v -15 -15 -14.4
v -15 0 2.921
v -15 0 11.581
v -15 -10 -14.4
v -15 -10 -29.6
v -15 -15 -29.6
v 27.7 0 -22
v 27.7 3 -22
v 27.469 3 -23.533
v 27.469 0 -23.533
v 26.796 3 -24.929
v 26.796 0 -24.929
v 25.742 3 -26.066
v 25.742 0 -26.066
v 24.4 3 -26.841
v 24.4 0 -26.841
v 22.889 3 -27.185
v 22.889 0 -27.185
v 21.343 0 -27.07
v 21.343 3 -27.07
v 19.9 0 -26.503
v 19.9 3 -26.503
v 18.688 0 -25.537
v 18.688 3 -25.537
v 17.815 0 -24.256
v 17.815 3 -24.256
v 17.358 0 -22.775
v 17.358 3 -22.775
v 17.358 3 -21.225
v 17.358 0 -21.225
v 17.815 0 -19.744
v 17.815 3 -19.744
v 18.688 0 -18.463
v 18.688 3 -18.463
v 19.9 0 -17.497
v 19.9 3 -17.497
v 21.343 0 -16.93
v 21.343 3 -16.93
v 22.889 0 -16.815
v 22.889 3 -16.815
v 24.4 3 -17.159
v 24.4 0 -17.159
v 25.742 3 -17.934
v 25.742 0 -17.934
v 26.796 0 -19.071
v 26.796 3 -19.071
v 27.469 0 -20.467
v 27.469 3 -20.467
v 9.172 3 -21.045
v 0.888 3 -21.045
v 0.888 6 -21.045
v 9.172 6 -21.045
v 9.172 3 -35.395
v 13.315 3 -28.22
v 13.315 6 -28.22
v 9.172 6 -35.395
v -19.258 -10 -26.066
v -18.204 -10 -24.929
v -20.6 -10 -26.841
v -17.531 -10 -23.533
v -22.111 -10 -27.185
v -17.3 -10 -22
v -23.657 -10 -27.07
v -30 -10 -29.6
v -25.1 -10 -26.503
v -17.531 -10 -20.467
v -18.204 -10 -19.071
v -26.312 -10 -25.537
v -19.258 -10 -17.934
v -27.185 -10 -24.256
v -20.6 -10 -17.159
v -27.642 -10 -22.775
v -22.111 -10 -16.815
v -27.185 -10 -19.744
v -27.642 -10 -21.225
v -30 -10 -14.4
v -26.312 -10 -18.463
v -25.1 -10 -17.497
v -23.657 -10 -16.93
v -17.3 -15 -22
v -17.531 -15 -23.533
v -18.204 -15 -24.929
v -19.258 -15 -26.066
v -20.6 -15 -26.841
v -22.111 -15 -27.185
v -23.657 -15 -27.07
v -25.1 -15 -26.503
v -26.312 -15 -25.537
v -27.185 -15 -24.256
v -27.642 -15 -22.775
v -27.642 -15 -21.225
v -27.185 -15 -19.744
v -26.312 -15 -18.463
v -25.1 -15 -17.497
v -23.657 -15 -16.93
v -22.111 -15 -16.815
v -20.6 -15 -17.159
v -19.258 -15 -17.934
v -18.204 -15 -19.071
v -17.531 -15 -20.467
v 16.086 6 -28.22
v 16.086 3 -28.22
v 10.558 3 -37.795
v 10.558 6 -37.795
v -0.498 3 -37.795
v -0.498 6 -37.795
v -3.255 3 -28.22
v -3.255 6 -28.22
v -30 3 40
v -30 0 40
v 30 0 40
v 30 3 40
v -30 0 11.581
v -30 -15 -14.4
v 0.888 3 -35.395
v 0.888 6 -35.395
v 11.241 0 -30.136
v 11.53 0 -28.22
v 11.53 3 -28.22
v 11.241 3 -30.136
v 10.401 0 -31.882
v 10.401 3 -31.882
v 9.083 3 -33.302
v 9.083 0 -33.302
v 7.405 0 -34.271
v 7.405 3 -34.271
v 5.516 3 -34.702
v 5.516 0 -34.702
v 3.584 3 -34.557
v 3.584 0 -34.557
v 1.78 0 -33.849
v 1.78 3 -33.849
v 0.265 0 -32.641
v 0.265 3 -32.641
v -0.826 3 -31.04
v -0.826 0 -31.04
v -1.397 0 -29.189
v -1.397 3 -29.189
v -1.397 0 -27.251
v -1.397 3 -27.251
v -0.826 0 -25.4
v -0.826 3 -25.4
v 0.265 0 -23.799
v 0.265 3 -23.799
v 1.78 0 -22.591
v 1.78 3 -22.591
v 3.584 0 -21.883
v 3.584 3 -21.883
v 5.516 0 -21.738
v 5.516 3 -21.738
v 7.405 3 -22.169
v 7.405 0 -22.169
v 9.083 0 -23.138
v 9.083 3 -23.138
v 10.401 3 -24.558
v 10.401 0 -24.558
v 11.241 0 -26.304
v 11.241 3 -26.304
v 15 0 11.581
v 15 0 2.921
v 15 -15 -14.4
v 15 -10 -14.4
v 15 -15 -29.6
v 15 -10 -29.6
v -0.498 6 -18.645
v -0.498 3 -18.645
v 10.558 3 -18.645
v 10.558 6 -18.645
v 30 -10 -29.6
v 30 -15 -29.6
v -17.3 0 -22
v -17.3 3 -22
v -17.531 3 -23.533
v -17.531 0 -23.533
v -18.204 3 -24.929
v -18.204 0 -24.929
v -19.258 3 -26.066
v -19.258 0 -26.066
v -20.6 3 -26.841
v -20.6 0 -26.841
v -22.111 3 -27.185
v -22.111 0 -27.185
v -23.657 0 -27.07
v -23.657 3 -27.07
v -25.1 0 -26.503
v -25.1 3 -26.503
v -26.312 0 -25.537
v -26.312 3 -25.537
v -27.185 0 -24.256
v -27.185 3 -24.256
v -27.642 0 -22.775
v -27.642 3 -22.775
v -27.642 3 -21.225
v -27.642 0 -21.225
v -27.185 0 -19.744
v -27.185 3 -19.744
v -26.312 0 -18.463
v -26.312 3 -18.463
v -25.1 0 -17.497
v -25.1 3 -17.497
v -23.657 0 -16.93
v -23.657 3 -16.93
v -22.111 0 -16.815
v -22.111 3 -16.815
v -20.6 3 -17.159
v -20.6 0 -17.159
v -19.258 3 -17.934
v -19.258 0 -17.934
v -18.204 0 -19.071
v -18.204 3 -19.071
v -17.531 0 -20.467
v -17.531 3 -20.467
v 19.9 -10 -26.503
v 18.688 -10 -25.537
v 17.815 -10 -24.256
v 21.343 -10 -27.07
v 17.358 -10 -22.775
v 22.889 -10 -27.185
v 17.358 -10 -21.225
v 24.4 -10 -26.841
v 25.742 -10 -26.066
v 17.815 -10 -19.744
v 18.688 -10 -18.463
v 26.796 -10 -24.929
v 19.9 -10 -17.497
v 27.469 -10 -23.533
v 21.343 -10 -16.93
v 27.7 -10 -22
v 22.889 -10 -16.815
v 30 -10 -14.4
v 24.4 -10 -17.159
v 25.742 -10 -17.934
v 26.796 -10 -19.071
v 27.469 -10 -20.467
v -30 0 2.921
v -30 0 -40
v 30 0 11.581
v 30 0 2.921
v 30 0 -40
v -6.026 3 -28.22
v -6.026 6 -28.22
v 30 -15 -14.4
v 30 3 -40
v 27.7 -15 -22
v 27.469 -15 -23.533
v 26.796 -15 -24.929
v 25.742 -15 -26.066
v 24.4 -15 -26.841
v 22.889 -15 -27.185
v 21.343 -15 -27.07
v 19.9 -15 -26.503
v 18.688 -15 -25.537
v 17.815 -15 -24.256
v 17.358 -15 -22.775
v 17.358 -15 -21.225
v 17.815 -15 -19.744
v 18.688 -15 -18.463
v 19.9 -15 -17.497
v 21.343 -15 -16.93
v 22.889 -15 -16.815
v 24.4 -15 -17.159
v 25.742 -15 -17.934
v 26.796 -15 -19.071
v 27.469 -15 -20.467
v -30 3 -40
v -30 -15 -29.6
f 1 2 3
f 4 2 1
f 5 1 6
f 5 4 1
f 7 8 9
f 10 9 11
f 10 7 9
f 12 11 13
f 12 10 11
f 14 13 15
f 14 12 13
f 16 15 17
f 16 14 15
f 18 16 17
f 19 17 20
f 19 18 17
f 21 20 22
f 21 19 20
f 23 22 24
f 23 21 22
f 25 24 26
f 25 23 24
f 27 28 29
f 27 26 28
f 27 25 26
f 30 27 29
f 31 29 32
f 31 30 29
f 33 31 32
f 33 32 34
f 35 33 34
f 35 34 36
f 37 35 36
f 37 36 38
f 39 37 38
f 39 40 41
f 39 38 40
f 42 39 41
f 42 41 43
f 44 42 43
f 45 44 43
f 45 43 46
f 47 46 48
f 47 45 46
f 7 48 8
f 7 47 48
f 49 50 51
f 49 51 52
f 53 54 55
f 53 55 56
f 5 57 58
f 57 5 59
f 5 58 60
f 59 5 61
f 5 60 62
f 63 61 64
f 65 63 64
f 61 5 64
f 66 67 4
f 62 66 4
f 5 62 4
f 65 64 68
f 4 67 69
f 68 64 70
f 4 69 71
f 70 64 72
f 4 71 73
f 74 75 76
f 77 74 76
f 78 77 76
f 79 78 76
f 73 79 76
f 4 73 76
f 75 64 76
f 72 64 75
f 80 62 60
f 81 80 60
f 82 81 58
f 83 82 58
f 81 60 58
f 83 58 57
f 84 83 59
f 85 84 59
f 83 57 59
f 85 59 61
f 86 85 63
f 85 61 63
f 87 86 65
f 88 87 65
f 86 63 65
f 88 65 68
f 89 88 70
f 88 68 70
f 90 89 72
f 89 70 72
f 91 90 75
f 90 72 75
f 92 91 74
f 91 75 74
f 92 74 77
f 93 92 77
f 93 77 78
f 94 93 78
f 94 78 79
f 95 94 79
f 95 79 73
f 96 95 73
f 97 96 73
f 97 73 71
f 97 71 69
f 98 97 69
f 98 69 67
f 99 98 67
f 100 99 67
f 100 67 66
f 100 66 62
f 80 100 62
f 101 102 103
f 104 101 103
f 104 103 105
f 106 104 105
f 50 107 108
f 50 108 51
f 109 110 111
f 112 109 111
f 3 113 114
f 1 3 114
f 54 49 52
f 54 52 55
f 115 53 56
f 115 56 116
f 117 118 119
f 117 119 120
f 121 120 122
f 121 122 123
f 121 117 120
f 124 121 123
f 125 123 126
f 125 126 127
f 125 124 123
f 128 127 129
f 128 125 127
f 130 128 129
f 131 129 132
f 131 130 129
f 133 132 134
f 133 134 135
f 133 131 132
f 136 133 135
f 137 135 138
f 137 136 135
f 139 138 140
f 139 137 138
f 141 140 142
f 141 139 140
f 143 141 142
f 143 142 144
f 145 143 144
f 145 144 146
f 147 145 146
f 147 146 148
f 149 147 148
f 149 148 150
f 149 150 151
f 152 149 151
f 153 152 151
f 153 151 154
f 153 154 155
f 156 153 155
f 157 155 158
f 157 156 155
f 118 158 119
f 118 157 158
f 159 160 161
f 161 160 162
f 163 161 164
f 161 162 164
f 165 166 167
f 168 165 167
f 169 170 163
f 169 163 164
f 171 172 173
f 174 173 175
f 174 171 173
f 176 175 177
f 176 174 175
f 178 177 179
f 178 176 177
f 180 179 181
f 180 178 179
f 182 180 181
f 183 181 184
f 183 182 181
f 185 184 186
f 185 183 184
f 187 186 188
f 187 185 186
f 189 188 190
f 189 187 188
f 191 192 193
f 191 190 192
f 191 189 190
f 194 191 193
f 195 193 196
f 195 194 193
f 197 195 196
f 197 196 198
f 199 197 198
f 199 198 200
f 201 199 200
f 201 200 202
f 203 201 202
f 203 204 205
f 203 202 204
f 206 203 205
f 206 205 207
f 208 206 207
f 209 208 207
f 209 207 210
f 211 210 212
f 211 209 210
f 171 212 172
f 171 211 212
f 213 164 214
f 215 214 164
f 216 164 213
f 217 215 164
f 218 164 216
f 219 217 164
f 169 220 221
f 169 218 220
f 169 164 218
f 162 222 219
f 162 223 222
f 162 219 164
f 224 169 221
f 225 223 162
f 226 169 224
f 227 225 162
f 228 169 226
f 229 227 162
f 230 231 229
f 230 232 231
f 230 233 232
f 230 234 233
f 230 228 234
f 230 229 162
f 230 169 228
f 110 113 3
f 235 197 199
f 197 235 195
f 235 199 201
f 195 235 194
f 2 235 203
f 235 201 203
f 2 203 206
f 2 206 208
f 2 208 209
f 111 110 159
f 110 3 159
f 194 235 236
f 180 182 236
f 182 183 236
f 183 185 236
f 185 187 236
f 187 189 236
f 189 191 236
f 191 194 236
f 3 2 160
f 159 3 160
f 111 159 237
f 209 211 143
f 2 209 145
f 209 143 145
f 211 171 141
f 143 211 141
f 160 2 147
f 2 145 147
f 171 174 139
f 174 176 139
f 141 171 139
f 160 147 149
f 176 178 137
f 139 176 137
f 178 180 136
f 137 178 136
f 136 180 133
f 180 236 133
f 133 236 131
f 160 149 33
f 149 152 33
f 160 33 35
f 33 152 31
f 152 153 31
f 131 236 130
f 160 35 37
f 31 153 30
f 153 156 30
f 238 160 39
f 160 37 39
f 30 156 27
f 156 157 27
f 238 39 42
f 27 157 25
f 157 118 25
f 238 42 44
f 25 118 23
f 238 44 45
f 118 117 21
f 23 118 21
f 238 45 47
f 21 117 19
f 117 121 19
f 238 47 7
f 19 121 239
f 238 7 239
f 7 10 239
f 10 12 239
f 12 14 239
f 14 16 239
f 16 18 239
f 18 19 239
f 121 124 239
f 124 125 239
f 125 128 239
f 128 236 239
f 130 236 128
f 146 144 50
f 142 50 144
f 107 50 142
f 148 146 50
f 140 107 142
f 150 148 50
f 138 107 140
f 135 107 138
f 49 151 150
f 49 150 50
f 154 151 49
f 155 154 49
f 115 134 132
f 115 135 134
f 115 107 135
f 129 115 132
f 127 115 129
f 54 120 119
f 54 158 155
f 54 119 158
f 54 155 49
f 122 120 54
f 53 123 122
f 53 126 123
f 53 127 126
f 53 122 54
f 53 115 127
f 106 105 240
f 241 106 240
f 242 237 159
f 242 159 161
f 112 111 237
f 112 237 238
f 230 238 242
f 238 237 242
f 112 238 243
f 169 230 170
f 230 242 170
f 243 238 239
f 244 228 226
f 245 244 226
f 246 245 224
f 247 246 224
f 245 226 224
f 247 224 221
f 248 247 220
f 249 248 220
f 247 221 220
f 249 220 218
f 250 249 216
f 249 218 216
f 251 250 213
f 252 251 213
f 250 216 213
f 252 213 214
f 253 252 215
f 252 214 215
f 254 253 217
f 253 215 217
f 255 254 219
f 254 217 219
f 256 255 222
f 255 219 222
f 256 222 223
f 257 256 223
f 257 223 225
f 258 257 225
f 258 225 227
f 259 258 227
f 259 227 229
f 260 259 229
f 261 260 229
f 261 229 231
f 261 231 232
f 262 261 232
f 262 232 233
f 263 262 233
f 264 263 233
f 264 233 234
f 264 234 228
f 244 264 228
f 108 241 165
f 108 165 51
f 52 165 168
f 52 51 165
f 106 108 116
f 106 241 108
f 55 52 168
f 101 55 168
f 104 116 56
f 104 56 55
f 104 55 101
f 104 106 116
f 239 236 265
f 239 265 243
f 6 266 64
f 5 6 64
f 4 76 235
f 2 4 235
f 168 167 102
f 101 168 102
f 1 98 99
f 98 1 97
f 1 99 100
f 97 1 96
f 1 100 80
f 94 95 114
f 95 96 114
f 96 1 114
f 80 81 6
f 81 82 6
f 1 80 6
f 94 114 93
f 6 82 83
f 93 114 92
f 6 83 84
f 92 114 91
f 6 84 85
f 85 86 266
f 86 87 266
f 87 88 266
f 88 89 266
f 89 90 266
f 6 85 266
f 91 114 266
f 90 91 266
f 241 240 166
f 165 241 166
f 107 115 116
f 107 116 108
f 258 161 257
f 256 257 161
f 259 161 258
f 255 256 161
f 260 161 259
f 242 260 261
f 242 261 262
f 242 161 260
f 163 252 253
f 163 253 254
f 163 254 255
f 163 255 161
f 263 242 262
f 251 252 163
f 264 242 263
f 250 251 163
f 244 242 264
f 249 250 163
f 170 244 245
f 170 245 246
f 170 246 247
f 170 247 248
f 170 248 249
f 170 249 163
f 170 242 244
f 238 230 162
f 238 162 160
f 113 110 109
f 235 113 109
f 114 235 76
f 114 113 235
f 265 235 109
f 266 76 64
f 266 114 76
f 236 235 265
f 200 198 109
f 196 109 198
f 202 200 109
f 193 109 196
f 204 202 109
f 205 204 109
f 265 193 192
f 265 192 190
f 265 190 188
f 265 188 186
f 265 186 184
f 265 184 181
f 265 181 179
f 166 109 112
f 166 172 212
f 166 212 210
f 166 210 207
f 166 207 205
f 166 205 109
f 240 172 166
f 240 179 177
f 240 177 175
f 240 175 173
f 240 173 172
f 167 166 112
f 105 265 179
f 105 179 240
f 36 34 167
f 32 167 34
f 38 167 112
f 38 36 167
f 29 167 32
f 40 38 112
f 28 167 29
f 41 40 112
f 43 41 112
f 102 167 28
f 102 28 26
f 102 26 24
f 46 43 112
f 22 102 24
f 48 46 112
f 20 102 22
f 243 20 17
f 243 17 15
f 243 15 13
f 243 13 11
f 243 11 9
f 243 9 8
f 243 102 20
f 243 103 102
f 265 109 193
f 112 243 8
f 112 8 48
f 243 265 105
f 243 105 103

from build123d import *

# Parameters (mm, degrees)
SKETCH1_W               = 60
SKETCH1_H               = 80
SKETCH1_R               = 6.5
BOSS_EXTRUDE4_DEPTH     = 3
BOSS_EXTRUDE5_START     = 30
BOSS_EXTRUDE5_DEPTH     = 15
BOSS_EXTRUDE6_START     = -30
BOSS_EXTRUDE6_DEPTH     = 15
BOSS_EXTRUDE7_DEPTH     = 6
SKETCH1_7_R             = 5.2
CUT_EXTRUDE1_DEPTH      = 7
CUT_EXTRUDE1_DEPTH_BACK = 16


with BuildPart() as part:
    # Sketch1 → Boss-Extrude4 (new body)
    with BuildSketch(Plane(origin=(0, 0, 0), x_dir=(1, 0, 0), z_dir=(0, 1, 0))):
        Rectangle(SKETCH1_W, SKETCH1_H)
        with Locations((5.03, 28.22)):
            Circle(SKETCH1_R, mode=Mode.SUBTRACT)
    extrude(amount=BOSS_EXTRUDE4_DEPTH)

    # Sketch2 → Boss-Extrude5 (add)
    with BuildSketch(Plane(origin=(0, 0, 0), x_dir=(0, 0, -1), z_dir=(1, 0, 0)).offset(BOSS_EXTRUDE5_START)):
        Polygon((-2.920508076, 0), (-11.580762114, 0), (14.4, -15), (29.6, -15), (29.6, -10), (14.4, -10), align=None)
    extrude(amount=-BOSS_EXTRUDE5_DEPTH)

    # Sketch2<3> → Boss-Extrude6 (add)
    with BuildSketch(Plane(origin=(0, 0, 0), x_dir=(0, 0, -1), z_dir=(1, 0, 0)).offset(BOSS_EXTRUDE6_START)):
        Polygon((-2.920508076, 0), (-11.580762114, 0), (14.4, -15), (29.6, -15), (29.6, -10), (14.4, -10), align=None)
    extrude(amount=BOSS_EXTRUDE6_DEPTH)

    # Sketch1<6> → Boss-Extrude7 (add)
    with BuildSketch(Plane(origin=(0, 0, 0), x_dir=(1, 0, 0), z_dir=(0, 1, 0))):
        Polygon((-6.026257655, 28.22), (-0.498128827, 18.645), (10.558128827, 18.645), (16.086257655, 28.22), (10.558128827, 37.795), (-0.498128827, 37.795), align=None)
        Polygon((9.172488181, 35.395), (0.887511819, 35.395), (-3.254976363, 28.22), (0.887511819, 21.045), (9.172488181, 21.045), (13.314976363, 28.22), align=None, mode=Mode.SUBTRACT)
    extrude(amount=BOSS_EXTRUDE7_DEPTH)

    # Sketch1<7> → Cut-Extrude1 (cut, two sides)
    with BuildSketch(Plane(origin=(0, 0, 0), x_dir=(1, 0, 0), z_dir=(0, 1, 0))) as cut_extrude1_sk:
        with Locations((-22.5, 22)):
            Circle(SKETCH1_7_R)
        with Locations((22.5, 22)):
            Circle(SKETCH1_7_R)
    extrude(amount=CUT_EXTRUDE1_DEPTH, mode=Mode.SUBTRACT)
    extrude(cut_extrude1_sk.sketch, amount=-CUT_EXTRUDE1_DEPTH_BACK, mode=Mode.SUBTRACT)


solid = part.part
